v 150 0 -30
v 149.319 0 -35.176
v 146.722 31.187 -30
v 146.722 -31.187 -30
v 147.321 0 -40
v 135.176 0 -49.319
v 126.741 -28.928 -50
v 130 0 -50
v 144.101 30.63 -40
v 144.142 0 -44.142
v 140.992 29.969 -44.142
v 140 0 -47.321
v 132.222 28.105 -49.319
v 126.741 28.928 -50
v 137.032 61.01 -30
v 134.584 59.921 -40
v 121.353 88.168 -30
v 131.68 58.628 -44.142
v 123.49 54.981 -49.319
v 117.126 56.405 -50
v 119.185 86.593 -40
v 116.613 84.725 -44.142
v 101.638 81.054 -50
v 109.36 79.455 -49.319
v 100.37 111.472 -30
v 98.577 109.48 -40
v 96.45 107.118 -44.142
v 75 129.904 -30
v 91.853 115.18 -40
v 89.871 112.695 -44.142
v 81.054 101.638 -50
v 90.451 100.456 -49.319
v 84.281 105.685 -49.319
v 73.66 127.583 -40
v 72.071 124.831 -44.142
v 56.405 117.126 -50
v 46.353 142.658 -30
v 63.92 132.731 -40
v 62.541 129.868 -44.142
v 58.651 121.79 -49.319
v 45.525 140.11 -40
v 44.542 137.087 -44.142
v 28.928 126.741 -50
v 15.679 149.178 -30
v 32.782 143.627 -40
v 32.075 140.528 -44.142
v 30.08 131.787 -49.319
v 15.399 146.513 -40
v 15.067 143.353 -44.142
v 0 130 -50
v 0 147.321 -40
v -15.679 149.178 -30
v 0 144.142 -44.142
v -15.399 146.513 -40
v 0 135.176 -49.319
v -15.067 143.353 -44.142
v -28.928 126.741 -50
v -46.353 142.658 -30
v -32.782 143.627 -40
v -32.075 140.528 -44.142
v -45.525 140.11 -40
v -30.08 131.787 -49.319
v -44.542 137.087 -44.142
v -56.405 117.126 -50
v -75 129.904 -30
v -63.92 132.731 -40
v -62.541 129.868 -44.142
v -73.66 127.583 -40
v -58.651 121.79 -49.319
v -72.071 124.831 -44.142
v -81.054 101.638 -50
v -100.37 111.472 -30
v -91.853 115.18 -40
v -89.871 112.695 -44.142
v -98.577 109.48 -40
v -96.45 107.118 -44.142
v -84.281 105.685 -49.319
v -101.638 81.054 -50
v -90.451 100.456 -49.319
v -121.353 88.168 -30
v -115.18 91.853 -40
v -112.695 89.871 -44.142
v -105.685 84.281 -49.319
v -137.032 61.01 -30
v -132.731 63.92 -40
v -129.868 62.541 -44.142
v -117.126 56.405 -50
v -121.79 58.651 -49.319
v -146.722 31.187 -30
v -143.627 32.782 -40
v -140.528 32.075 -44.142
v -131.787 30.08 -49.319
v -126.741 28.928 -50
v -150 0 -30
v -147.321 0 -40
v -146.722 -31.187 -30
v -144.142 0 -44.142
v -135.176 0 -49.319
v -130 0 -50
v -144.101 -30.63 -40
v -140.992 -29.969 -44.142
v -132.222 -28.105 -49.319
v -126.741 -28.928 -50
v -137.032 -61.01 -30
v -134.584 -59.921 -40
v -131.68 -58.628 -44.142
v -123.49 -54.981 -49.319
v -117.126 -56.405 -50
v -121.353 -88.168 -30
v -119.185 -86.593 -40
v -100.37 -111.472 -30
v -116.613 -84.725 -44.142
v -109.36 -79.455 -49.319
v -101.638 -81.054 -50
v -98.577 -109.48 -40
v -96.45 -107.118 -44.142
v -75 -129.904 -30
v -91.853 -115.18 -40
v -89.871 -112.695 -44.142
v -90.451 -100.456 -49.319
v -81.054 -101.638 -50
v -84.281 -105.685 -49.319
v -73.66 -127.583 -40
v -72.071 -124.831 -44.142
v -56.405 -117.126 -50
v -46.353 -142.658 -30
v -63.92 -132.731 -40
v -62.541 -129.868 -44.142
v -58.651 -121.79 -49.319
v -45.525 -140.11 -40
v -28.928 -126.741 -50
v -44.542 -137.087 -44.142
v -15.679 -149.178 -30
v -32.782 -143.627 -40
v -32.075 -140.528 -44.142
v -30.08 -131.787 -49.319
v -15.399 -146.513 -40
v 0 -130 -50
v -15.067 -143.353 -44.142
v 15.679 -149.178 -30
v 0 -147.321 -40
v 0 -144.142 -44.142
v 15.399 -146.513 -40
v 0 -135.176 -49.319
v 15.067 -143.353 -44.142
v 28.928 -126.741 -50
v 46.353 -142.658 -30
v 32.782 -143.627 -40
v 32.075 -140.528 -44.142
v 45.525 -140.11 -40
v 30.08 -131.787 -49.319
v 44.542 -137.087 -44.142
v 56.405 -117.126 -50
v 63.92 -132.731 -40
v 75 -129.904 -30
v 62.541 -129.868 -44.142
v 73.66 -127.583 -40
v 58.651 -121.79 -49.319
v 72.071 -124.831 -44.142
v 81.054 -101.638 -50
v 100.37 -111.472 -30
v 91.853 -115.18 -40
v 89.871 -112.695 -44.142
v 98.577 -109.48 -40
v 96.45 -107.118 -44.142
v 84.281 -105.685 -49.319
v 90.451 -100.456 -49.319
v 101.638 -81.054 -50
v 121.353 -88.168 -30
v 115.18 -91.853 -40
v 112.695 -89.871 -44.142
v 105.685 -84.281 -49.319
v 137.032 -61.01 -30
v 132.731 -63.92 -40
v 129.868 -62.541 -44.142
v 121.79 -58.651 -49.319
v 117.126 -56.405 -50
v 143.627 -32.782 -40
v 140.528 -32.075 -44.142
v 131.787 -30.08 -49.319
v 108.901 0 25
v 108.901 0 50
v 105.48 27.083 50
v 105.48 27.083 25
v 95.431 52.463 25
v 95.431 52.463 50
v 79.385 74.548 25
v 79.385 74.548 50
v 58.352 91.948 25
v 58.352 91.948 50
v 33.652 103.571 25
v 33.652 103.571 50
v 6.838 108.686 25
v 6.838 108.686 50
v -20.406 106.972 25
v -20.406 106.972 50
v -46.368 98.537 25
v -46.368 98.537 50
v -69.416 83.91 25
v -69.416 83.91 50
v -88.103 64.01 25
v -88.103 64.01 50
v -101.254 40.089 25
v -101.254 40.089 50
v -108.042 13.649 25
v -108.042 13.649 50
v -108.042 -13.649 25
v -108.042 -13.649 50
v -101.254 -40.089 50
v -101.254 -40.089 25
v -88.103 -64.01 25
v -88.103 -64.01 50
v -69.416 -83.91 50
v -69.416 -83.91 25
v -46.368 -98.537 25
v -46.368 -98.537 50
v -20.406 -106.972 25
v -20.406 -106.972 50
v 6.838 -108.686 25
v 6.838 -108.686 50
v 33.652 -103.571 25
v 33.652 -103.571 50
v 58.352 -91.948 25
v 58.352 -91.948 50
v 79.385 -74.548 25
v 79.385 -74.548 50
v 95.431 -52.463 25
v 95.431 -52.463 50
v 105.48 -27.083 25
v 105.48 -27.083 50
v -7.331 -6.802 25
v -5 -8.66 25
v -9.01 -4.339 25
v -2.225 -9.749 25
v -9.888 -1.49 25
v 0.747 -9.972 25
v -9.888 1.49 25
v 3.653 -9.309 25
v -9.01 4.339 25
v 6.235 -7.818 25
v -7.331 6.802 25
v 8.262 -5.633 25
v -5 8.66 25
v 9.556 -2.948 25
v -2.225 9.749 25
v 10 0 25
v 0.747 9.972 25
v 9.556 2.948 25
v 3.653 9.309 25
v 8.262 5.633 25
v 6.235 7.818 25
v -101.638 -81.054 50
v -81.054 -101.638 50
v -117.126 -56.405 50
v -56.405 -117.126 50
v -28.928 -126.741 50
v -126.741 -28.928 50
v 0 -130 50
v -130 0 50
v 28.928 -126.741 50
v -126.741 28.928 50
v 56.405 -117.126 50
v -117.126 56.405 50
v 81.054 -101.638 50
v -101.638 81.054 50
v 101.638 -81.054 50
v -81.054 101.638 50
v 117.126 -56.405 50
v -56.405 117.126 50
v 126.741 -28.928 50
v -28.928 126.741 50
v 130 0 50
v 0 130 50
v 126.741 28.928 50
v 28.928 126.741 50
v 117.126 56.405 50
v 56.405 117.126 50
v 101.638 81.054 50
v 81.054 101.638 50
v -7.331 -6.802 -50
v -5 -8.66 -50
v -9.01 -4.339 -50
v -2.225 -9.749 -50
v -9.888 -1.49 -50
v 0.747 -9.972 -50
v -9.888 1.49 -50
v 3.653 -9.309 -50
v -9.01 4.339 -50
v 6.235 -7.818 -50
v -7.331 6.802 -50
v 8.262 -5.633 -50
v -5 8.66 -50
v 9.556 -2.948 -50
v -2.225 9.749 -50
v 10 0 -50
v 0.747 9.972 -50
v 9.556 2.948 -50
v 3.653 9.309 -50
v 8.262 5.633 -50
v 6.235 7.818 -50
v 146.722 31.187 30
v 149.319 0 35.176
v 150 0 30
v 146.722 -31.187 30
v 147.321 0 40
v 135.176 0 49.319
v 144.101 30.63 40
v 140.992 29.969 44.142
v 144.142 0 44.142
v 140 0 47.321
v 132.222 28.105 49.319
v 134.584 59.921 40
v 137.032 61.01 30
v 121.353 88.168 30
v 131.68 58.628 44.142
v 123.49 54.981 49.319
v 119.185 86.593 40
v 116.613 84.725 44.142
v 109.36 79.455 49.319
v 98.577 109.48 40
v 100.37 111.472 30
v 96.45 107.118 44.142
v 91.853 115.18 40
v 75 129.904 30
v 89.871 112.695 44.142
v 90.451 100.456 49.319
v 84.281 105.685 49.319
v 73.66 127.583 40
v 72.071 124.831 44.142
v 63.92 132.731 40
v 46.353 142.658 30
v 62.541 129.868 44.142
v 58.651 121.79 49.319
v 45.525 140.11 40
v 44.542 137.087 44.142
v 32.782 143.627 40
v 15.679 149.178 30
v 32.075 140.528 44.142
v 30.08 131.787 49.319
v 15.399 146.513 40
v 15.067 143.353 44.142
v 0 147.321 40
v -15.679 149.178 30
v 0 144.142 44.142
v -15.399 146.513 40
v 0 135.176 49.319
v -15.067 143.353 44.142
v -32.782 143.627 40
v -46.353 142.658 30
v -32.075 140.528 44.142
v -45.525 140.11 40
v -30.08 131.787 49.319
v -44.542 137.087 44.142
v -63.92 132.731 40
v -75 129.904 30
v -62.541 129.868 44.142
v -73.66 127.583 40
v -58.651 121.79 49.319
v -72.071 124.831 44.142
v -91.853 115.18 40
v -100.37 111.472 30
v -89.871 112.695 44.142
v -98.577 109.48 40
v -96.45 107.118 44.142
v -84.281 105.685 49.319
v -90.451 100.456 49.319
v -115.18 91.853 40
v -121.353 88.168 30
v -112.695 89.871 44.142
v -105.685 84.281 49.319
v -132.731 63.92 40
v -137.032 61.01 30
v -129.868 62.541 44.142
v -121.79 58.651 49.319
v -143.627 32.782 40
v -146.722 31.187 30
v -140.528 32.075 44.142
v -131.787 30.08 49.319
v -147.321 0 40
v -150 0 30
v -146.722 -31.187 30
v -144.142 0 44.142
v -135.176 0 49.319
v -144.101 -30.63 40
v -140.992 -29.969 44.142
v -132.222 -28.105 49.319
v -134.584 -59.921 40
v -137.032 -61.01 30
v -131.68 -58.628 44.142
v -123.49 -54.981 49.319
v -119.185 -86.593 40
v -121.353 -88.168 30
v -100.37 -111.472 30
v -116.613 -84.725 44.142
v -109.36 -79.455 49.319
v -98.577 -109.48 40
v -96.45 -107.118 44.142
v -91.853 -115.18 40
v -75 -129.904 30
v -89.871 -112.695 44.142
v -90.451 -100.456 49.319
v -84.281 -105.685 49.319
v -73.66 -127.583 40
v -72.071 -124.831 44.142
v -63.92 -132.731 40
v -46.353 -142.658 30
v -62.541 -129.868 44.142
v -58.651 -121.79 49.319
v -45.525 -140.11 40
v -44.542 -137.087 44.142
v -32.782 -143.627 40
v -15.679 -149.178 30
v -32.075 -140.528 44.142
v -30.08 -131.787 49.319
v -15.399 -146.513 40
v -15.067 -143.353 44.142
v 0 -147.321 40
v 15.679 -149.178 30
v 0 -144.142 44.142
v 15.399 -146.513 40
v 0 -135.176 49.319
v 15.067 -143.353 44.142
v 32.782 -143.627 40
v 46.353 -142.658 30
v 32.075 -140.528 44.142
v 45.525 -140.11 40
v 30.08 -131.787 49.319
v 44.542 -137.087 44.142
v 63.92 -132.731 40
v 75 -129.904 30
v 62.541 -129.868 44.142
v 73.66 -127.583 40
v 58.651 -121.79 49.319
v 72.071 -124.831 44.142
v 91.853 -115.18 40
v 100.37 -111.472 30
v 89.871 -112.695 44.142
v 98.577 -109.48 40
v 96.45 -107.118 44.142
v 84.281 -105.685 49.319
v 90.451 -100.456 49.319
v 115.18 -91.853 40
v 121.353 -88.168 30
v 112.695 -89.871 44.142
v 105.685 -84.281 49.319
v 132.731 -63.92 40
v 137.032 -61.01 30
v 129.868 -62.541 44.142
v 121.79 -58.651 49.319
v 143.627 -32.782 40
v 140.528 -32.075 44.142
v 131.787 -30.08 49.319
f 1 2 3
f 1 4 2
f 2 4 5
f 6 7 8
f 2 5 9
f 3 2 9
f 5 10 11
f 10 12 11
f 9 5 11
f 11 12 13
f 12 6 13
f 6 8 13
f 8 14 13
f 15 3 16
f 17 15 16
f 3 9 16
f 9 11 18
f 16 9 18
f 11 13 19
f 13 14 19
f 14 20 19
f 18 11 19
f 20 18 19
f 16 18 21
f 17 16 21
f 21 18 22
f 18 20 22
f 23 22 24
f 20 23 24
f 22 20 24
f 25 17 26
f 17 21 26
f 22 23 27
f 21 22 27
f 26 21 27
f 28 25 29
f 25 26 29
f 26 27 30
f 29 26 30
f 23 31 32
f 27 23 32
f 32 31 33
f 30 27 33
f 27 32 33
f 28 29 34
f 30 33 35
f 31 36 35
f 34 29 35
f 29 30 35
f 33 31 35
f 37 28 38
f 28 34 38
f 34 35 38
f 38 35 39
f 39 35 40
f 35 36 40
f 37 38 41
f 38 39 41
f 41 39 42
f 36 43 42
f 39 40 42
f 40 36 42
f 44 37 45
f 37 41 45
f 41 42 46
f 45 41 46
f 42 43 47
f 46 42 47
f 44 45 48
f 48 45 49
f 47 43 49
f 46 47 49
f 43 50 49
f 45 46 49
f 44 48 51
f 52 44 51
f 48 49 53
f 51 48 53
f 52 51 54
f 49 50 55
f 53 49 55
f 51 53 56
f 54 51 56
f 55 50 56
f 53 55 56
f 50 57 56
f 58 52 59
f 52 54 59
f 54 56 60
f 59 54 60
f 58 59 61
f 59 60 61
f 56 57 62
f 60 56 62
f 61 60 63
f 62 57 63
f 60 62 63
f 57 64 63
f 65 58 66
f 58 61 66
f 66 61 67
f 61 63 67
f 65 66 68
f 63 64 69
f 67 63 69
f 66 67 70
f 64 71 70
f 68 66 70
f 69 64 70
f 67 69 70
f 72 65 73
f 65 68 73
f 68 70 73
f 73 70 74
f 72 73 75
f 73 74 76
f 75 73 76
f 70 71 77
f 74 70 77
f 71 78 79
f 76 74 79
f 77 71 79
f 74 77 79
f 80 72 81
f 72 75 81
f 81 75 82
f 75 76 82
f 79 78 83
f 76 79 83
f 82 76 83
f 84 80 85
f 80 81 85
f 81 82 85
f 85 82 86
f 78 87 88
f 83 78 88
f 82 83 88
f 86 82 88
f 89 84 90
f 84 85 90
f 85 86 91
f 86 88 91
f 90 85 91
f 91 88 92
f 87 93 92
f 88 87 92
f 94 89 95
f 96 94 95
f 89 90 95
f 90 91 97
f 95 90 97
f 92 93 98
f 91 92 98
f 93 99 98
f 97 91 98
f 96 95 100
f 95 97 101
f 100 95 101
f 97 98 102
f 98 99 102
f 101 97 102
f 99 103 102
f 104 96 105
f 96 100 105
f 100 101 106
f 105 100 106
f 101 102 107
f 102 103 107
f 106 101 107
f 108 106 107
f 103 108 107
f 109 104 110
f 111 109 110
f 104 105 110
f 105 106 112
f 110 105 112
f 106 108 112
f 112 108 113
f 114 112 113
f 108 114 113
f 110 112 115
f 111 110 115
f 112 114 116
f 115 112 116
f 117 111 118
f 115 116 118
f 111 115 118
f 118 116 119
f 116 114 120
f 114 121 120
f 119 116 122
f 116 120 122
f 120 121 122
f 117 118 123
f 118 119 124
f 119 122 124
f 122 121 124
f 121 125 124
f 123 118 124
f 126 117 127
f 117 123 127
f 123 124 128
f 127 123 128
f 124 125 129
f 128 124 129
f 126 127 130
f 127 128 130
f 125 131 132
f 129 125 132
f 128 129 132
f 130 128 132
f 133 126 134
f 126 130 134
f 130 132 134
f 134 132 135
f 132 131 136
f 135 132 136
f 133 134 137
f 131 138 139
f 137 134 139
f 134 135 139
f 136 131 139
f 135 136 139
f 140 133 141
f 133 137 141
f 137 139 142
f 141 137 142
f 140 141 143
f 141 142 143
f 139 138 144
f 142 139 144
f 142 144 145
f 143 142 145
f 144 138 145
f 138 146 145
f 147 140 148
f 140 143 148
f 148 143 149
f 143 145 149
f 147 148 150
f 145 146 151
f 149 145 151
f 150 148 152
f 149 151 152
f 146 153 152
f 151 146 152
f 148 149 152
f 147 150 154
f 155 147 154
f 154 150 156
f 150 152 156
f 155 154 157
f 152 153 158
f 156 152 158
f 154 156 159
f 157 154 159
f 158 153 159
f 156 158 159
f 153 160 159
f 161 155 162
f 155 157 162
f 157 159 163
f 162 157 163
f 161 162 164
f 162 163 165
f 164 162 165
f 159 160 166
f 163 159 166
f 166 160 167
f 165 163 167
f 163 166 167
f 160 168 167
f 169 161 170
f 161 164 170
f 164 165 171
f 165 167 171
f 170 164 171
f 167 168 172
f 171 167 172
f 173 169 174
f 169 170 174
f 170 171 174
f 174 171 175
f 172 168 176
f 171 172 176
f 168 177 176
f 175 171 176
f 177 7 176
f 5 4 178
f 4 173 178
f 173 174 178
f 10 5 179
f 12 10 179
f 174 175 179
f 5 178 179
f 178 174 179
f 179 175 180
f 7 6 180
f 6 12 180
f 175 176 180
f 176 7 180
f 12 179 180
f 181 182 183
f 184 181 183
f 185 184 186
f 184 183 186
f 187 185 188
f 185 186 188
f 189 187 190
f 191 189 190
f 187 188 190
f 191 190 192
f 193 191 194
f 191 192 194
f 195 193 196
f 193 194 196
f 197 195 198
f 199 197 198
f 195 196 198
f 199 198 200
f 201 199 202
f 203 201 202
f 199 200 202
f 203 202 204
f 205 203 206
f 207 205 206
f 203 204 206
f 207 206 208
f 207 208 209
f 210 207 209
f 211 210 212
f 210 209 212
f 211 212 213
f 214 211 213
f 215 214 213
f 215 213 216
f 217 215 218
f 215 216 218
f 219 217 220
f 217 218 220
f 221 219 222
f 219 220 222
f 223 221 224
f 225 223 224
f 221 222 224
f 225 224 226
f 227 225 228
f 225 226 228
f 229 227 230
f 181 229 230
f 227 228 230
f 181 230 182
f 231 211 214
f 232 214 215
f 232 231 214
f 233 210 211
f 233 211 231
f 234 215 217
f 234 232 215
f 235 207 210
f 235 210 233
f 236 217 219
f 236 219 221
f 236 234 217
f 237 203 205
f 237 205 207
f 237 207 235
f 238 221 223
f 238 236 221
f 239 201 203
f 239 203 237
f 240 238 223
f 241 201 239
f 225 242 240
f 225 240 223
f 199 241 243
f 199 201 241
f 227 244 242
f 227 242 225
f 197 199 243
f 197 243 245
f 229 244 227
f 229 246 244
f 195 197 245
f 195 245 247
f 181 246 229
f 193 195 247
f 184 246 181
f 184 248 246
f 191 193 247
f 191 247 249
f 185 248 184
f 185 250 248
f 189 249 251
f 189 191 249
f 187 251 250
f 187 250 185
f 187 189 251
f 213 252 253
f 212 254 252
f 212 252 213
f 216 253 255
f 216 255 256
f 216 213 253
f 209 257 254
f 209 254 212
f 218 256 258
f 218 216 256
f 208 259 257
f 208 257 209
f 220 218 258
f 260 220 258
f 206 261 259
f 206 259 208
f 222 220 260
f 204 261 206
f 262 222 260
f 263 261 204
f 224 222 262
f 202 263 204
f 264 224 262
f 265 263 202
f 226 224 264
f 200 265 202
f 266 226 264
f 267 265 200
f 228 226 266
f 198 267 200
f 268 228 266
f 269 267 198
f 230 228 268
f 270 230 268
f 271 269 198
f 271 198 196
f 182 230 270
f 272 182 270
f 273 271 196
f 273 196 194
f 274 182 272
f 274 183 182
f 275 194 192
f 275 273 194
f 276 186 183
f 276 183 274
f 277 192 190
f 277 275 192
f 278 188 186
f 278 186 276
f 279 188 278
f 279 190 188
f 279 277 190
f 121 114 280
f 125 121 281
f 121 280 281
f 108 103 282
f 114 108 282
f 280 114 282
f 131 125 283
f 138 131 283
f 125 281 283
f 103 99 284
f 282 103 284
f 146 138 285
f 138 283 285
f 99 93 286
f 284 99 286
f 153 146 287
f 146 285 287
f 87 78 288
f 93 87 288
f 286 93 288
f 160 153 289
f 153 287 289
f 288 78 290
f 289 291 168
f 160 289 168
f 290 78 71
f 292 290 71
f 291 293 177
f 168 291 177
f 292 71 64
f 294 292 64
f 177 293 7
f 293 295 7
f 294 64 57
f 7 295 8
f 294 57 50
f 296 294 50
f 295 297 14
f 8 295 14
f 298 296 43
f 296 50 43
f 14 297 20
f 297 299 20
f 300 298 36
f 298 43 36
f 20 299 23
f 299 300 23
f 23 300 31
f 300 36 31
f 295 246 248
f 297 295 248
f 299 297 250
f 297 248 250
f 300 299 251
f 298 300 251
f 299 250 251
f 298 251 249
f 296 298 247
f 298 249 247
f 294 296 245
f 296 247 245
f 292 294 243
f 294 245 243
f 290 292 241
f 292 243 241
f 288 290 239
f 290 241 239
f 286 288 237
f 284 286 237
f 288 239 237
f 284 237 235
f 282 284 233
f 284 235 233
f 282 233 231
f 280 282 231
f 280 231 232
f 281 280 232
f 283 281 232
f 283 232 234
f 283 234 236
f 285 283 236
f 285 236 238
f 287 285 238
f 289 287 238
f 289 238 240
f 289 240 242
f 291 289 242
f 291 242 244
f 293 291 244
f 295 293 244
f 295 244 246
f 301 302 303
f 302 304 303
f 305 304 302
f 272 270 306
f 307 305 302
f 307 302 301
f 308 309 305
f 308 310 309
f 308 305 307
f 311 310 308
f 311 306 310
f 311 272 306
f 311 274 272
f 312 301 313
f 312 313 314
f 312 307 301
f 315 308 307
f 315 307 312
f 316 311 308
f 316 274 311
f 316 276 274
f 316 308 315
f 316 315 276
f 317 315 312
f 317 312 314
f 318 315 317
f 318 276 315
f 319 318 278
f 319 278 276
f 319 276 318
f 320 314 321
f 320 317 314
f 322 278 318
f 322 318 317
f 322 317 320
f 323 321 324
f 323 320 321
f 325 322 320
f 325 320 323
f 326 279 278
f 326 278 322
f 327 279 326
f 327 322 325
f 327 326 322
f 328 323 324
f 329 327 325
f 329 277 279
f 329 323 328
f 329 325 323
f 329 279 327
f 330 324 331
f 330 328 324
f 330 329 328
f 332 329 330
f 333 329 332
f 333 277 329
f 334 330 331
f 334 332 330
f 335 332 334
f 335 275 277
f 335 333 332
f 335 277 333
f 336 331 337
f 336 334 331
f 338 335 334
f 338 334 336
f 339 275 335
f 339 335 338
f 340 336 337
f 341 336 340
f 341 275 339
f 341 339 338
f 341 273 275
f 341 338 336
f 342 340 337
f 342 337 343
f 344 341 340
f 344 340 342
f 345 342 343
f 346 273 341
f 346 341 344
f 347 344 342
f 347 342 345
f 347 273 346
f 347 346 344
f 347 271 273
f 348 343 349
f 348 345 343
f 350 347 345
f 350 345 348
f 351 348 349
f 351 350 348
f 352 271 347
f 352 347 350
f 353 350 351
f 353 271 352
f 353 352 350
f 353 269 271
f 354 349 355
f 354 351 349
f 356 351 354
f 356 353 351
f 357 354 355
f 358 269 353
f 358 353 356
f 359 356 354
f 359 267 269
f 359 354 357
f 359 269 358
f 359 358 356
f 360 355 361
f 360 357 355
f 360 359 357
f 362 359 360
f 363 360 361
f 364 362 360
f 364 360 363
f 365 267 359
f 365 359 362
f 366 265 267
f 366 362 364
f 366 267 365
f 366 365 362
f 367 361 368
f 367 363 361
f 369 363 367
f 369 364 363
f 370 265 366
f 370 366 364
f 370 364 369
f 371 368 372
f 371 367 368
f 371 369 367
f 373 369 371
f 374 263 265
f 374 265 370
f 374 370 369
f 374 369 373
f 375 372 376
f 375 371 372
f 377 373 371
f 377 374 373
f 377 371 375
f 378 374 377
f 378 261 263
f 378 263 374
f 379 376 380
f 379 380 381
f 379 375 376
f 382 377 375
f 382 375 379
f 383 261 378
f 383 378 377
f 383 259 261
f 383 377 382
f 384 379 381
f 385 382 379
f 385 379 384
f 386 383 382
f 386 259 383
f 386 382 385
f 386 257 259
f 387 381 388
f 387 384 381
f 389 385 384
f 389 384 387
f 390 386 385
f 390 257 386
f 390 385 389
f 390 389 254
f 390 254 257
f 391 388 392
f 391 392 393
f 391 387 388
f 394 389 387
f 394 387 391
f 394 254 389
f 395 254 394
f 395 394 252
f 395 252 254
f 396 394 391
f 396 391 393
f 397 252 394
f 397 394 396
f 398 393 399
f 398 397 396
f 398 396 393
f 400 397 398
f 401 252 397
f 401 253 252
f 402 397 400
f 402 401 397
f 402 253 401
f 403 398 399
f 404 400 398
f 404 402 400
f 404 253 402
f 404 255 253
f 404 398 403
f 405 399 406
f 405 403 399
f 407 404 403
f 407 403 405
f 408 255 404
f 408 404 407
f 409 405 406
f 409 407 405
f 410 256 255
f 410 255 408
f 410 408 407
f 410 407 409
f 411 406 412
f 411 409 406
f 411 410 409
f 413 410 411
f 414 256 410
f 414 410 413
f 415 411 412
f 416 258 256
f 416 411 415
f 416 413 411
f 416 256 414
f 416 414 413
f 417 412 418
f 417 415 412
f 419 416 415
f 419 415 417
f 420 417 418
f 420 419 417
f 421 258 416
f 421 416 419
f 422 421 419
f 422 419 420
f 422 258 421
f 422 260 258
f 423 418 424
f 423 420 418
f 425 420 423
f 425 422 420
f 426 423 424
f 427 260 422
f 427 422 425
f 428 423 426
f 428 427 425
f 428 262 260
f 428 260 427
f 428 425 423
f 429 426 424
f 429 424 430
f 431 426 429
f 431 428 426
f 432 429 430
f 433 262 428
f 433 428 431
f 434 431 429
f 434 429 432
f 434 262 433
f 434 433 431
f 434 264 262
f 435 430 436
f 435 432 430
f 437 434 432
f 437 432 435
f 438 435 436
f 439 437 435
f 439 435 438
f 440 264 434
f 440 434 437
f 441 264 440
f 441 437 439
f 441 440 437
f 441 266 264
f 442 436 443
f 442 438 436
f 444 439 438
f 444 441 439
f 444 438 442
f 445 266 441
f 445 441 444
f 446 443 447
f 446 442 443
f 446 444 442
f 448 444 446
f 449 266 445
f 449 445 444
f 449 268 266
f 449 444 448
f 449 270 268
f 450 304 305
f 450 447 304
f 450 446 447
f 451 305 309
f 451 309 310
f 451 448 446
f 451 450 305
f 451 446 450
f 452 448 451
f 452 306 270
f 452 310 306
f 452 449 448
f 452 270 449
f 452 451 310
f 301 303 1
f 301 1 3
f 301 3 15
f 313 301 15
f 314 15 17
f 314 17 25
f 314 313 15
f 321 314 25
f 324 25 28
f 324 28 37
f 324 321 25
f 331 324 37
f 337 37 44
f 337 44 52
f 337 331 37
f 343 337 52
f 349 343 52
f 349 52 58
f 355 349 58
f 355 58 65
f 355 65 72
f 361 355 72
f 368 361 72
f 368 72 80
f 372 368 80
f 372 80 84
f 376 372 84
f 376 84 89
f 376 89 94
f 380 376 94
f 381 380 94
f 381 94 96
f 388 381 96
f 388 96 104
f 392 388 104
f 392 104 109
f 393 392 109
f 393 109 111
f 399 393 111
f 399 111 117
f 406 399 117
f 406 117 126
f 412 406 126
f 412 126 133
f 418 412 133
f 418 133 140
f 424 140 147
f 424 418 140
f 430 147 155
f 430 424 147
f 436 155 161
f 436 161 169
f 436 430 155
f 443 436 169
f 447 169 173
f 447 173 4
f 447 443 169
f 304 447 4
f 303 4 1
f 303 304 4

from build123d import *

# Parameters (mm, degrees)
F0_R     = 150
F1_DEPTH = 50
F2_R     = 20
F3_R     = 108.901018
F4_DEPTH = 25
F5_R     = 10
F6_DEPTH = 150


with BuildPart() as f1:
    # F0 (on Top) → F1 (new body, symmetric)
    with BuildSketch(Plane.XY):
        Circle(F0_R)
    extrude(amount=F1_DEPTH, both=True)

    # F2
    f2_edges = [f1.edges().sort_by_distance(p)[0] for p in [
        (-150, 0, 50),
        (-150, 0, -50),
    ]]
    fillet(f2_edges, radius=F2_R)

    # F3 (on face) → F4 (cut)
    with BuildSketch(Plane.XY.offset(50)):
        Circle(F3_R)
    extrude(amount=-F4_DEPTH, mode=Mode.SUBTRACT)

    # F5 (on face) → F6 (cut)
    with BuildSketch(Plane.XY.offset(25)):
        Circle(F5_R)
    extrude(amount=-F6_DEPTH, mode=Mode.SUBTRACT)


solid = f1.part
